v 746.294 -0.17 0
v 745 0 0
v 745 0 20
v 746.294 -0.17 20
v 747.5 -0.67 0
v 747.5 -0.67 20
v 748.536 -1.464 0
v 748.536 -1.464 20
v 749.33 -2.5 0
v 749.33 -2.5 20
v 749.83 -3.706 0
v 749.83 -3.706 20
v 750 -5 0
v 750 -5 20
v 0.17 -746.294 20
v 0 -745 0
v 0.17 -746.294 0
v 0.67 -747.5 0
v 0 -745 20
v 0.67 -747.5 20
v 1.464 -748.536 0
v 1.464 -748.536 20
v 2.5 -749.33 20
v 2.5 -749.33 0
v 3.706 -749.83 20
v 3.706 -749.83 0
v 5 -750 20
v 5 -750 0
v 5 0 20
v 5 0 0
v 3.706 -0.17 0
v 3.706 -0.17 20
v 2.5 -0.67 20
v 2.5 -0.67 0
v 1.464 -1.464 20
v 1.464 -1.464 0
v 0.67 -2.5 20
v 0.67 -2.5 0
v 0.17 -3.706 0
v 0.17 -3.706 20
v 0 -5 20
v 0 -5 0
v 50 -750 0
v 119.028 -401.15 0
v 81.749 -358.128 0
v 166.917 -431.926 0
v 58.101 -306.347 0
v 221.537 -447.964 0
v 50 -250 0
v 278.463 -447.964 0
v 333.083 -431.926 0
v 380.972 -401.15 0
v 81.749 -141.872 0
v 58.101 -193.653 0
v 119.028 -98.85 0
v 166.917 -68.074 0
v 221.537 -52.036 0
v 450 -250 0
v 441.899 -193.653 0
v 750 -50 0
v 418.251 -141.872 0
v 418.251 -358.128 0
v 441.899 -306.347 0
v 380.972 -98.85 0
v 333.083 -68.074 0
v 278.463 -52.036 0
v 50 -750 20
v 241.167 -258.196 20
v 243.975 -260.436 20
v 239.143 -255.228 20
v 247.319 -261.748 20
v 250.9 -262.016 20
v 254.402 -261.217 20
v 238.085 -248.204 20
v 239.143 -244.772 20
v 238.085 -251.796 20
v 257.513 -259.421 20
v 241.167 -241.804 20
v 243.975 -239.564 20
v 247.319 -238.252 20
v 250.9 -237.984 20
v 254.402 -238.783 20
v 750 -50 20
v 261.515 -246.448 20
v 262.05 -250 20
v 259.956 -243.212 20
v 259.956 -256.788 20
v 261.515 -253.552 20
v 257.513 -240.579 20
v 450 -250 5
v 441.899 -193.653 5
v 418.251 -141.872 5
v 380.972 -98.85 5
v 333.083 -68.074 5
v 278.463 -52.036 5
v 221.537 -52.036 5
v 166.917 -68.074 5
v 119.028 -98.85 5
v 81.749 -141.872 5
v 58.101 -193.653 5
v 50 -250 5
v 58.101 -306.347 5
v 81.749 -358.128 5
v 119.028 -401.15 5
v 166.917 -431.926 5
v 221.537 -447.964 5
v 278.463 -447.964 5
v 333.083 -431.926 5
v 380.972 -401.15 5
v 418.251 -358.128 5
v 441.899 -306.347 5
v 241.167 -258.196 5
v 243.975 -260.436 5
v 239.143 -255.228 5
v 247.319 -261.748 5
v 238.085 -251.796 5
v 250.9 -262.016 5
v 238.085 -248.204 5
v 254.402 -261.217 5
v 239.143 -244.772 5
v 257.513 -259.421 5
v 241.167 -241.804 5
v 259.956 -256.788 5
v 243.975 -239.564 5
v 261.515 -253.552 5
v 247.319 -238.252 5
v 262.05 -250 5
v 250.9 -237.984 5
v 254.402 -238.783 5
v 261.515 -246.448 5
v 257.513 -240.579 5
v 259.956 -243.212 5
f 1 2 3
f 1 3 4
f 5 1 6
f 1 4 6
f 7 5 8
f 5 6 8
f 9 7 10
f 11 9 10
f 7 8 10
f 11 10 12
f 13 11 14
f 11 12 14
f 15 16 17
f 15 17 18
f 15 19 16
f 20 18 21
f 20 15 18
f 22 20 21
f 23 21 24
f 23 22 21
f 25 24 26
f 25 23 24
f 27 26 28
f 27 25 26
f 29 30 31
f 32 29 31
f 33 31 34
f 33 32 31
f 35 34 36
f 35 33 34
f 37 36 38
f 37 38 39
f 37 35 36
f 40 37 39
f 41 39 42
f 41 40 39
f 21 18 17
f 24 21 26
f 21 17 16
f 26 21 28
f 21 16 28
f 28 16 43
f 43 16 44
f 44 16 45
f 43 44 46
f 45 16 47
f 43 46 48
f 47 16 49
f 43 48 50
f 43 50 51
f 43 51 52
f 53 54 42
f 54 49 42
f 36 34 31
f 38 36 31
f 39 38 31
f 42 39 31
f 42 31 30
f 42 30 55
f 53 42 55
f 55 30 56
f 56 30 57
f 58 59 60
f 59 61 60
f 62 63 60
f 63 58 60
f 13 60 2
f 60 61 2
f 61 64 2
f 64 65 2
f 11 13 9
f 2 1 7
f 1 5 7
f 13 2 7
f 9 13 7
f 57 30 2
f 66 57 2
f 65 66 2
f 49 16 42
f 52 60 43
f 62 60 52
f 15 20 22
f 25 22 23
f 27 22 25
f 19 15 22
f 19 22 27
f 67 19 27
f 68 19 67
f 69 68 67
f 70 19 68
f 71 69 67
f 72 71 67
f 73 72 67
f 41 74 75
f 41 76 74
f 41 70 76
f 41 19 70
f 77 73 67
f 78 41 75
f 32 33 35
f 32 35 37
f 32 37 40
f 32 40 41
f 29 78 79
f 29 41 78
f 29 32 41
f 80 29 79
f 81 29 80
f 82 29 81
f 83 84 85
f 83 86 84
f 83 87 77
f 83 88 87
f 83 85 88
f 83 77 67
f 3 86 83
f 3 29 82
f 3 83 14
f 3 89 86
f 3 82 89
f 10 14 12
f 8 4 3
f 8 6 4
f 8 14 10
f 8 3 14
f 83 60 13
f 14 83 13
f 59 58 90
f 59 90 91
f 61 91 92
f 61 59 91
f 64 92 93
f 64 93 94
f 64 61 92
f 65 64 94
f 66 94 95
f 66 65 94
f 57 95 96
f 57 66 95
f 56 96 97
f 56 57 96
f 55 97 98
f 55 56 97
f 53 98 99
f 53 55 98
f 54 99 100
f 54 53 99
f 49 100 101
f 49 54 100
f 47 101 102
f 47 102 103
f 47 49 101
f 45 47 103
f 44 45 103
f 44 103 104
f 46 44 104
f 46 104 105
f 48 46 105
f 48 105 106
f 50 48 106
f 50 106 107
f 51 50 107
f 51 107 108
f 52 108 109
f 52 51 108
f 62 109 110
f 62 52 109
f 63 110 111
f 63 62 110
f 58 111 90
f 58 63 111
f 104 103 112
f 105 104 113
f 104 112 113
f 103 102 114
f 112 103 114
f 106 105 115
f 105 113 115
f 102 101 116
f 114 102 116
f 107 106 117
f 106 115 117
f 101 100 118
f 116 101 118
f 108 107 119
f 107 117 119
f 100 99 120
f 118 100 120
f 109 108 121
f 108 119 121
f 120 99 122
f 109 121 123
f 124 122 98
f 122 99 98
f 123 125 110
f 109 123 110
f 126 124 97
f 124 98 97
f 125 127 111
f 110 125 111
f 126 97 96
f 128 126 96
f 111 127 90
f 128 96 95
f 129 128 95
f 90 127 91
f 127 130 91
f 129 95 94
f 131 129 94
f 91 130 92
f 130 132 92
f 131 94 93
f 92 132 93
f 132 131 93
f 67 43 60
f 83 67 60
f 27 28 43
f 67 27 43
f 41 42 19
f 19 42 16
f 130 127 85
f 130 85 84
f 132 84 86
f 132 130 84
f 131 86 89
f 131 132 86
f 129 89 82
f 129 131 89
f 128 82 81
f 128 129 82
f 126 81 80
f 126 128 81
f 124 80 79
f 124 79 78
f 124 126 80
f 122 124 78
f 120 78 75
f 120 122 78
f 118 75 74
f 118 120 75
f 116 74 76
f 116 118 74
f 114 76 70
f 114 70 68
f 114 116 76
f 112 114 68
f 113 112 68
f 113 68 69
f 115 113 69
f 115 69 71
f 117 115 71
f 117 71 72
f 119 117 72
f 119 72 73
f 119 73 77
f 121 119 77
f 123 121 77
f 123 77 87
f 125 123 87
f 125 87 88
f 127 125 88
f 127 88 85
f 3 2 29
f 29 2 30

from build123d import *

# Parameters (mm, degrees)
F0_R     = 12.05
F1_DEPTH = 20
F2_R     = 5
F3_R     = 200
F4_DEPTH = 5


with BuildPart() as f1:
    # F0 (on Top) → F1 (new body)
    with BuildSketch(Plane.XY):
        Polygon((750, 0), (0, 0), (0, -750), (50, -750), (750, -50), align=None)
        with Locations((250, -250)):
            Circle(F0_R, mode=Mode.SUBTRACT)
    extrude(amount=F1_DEPTH)

    # F2
    f2_edges = [f1.edges().sort_by_distance(p)[0] for p in [
        (0, -750, 10),
        (750, 0, 10),
        (0, 0, 10),
    ]]
    fillet(f2_edges, radius=F2_R)

    # F3 (on Top) → F4 (cut)
    with BuildSketch(Plane.XY):
        with Locations((250, -250)):
            Circle(F3_R)
    extrude(amount=F4_DEPTH, mode=Mode.SUBTRACT)


solid = f1.part
